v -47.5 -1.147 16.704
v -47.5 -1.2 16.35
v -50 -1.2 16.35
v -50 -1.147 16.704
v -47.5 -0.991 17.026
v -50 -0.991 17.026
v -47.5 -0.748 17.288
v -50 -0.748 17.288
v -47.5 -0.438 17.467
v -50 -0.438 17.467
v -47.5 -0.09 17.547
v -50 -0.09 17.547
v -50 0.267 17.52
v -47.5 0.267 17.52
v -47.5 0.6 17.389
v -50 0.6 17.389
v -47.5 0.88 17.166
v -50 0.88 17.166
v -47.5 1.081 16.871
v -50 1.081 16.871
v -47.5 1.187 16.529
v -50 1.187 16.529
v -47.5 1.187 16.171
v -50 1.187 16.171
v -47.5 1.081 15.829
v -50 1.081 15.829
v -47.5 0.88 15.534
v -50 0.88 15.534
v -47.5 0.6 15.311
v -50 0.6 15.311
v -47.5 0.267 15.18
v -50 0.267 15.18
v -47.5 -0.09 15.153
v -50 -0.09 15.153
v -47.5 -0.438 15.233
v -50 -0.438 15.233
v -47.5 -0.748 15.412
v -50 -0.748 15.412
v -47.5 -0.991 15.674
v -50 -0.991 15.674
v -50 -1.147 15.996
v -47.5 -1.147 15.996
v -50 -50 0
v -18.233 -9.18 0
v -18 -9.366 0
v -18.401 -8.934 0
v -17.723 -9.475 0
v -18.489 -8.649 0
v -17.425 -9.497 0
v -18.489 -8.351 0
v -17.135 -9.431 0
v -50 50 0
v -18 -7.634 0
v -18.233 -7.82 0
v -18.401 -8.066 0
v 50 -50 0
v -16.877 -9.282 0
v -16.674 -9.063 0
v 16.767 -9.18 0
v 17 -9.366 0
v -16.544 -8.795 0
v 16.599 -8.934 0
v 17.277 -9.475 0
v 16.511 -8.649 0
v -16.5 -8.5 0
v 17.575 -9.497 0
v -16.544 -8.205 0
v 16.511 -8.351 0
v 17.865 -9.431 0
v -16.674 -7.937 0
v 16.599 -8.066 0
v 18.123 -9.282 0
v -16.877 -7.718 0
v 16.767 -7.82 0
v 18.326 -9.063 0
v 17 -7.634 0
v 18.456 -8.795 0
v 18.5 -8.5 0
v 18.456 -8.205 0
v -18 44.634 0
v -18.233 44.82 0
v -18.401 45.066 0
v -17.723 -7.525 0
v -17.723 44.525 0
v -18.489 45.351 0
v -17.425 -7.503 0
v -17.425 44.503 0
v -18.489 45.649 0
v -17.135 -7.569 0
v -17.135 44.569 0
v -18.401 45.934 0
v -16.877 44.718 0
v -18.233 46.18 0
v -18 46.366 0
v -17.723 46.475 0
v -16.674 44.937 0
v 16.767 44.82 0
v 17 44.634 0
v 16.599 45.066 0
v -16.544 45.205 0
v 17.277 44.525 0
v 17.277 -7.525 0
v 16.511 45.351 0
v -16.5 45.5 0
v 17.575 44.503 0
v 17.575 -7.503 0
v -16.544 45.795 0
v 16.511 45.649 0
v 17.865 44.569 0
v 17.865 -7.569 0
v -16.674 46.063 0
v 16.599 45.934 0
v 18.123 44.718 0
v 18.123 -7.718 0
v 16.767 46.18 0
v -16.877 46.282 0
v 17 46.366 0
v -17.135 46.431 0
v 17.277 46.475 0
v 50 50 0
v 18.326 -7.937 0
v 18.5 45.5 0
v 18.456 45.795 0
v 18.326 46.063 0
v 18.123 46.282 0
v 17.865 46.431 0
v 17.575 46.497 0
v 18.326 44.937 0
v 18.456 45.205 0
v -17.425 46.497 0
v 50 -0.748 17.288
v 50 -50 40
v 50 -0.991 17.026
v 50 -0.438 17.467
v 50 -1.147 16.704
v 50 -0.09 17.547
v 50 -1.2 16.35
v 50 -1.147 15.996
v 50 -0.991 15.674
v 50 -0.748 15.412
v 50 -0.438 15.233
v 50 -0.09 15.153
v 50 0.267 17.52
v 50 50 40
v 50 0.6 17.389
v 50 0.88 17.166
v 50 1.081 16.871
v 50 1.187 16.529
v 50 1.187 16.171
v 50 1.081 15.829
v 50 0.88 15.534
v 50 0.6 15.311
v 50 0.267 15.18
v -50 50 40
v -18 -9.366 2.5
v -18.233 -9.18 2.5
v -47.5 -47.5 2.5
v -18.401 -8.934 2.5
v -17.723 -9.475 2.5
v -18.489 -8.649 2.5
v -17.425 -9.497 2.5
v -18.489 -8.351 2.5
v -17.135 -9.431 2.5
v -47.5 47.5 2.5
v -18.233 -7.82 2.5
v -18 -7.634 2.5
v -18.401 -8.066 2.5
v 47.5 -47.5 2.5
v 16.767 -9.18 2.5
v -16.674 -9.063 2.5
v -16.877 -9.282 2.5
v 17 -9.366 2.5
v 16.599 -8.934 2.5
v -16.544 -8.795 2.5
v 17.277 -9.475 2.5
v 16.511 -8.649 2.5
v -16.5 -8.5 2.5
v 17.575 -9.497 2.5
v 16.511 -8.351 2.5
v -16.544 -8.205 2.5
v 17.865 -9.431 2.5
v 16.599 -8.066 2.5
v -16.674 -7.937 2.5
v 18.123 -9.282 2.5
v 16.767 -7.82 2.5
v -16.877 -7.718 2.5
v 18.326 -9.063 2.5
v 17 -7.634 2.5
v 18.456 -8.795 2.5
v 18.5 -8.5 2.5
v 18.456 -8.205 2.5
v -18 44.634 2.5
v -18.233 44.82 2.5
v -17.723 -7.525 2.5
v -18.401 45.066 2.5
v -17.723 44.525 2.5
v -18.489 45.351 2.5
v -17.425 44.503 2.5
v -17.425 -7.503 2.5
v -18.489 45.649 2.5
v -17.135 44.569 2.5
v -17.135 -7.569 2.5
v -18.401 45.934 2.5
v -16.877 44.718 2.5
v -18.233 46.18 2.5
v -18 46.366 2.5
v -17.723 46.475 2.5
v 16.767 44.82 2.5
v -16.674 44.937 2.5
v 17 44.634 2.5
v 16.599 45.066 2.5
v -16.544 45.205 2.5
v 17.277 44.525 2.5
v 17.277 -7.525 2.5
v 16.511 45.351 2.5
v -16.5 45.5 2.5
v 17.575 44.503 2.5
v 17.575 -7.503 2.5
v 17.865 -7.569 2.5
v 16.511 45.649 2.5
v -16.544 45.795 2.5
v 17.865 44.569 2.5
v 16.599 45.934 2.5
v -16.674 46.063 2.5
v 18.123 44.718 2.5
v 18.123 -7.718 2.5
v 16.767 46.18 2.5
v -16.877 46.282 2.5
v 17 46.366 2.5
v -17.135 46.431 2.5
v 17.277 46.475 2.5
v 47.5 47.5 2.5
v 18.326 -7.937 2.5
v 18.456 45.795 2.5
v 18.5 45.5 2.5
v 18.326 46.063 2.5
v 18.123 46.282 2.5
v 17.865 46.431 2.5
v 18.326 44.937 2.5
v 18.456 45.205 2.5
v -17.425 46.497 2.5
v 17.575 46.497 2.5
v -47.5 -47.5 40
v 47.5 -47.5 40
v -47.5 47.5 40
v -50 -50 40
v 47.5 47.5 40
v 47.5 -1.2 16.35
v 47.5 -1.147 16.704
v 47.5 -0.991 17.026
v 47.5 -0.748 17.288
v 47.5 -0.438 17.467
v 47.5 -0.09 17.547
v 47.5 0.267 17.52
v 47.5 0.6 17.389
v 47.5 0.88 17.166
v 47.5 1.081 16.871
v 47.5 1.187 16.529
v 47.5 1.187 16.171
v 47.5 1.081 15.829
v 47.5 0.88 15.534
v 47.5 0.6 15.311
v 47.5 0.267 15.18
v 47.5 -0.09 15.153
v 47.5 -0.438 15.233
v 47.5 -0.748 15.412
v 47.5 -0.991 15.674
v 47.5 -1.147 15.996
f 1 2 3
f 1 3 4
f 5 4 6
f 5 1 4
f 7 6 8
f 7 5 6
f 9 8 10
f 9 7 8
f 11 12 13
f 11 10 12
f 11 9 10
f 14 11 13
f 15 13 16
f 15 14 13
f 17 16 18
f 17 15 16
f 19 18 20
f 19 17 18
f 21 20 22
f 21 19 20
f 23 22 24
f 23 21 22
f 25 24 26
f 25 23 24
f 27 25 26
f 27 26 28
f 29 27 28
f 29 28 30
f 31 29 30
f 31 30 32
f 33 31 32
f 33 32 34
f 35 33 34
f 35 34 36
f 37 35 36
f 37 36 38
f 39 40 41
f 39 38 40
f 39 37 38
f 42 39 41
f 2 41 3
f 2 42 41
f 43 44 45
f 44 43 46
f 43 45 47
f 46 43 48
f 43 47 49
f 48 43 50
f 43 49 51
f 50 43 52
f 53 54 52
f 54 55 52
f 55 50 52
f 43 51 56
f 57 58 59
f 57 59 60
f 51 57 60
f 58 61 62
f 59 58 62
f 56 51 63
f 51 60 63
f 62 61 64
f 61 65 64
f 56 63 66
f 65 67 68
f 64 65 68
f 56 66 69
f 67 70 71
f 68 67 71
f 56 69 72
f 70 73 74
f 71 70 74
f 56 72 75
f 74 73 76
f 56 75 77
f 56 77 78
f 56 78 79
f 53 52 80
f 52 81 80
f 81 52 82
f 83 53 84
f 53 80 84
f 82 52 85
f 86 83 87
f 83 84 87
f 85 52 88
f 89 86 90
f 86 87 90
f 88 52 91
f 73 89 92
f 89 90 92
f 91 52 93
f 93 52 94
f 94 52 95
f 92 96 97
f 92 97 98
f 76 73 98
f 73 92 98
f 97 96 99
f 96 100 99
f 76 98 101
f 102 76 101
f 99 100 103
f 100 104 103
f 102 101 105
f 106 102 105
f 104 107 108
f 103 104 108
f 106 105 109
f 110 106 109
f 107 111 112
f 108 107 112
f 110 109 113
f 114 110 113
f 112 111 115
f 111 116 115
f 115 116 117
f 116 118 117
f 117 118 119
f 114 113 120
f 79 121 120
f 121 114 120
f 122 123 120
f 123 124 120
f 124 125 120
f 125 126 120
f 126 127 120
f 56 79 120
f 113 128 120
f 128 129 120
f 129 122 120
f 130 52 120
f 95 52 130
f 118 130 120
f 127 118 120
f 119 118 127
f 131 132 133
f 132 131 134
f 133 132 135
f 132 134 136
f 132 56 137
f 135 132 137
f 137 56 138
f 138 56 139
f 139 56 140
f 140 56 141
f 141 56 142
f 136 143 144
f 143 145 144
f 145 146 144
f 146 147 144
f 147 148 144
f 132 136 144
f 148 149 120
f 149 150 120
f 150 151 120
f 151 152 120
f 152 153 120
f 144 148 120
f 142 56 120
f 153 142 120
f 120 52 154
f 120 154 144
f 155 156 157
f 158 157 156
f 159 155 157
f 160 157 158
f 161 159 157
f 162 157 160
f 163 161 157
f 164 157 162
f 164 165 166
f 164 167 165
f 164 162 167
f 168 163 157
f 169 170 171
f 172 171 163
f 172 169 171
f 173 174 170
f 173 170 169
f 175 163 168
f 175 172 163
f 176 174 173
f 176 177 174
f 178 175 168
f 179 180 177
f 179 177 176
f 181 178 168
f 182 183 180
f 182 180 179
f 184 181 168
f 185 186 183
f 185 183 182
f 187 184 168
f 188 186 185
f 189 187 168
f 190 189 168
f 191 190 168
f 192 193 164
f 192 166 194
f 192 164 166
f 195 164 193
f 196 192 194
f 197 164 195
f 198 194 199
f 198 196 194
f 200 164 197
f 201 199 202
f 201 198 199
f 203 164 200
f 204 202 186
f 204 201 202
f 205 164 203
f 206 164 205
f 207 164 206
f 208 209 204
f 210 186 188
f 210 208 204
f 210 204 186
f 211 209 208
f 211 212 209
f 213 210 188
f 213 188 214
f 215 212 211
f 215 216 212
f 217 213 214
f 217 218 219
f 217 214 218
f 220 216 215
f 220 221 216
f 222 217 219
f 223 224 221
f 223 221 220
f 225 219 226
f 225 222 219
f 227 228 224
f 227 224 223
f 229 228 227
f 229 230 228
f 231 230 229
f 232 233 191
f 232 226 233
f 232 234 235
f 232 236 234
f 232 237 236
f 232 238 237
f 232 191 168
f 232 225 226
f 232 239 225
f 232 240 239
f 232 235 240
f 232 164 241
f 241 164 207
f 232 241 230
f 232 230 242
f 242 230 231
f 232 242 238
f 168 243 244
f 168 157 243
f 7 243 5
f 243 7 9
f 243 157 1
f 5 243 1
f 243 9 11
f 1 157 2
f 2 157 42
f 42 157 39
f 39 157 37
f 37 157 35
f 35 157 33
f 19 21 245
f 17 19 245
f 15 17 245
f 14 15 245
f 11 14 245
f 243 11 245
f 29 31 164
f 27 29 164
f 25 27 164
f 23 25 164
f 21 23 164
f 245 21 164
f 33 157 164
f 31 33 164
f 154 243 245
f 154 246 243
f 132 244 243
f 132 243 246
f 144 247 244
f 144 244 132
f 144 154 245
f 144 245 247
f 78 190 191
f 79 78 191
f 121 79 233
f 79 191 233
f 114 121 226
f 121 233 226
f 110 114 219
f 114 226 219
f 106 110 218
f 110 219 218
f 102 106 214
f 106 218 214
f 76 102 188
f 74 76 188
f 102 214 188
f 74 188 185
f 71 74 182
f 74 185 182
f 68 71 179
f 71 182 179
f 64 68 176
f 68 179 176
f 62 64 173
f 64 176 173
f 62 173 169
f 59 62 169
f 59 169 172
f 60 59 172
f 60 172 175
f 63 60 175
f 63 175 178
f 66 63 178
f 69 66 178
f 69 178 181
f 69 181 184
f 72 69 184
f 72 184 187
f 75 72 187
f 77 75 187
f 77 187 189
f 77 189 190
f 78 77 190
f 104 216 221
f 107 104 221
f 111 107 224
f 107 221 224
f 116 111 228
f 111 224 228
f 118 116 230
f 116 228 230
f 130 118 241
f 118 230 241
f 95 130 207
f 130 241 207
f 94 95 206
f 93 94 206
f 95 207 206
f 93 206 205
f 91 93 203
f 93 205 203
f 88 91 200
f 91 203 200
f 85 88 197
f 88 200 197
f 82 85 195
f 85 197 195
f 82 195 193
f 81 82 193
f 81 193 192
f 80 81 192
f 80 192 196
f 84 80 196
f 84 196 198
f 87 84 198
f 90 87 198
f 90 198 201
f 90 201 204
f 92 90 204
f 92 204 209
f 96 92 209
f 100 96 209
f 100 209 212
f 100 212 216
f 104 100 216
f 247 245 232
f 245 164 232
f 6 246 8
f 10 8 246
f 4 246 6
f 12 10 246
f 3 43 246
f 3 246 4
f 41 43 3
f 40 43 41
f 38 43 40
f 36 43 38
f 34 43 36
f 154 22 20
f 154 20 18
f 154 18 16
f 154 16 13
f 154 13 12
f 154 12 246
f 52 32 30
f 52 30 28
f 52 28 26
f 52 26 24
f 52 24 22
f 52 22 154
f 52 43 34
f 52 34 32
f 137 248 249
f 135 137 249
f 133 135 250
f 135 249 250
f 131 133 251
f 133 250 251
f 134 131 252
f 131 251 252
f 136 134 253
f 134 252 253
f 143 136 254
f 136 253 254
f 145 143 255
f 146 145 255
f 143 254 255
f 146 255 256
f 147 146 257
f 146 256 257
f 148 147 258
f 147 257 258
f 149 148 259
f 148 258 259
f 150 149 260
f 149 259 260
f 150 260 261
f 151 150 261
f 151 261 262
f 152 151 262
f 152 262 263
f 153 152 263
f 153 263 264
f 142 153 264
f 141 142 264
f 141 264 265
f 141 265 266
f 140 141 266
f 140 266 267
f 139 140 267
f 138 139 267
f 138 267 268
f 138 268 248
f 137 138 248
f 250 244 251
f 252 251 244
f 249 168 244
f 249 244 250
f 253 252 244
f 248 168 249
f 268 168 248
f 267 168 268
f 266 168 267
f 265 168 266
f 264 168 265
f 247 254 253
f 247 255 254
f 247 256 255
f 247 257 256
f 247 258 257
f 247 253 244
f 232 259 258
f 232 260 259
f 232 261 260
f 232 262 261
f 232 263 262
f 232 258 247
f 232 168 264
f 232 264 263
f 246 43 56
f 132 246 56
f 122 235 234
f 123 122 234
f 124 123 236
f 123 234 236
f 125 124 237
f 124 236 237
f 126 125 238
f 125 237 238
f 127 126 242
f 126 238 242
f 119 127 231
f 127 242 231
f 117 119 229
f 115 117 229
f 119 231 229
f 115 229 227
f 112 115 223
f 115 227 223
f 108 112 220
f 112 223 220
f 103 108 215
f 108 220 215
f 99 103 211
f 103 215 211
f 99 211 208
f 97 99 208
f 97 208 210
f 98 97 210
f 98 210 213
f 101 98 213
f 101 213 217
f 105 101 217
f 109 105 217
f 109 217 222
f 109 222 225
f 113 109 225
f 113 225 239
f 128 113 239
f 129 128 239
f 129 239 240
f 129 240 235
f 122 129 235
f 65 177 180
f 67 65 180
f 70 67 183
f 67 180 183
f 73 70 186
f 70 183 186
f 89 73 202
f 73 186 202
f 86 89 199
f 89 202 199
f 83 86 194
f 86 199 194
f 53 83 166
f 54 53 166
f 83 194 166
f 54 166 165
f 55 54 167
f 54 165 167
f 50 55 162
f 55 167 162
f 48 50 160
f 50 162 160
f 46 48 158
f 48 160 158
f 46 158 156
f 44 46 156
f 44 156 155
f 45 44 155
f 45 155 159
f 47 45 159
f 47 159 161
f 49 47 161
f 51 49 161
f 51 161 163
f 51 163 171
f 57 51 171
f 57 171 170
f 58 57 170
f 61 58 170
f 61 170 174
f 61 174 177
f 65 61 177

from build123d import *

# Parameters (mm, degrees)
F0_W     = 100
F0_H     = 100
F1_DEPTH = 40
F2_T     = -2.5
F3_R     = 1.2
F4_DEPTH = 97.501
F5_DEPTH = 25
F6_R     = 1
F7_DEPTH = 25


with BuildPart() as f1:
    # F0 (on Top) → F1 (new body)
    with BuildSketch(Plane.XY):
        Rectangle(F0_W, F0_H)
    extrude(amount=F1_DEPTH)

    # F2
    f2_openings = [f1.faces().sort_by_distance(p)[0] for p in [
        (0, 0, 40),
    ]]
    offset(amount=F2_T, openings=f2_openings)

    # F3 (on face) → F4 (cut, through all)
    with BuildSketch(Plane(origin=(47.5, 0, 0), x_dir=(0, -1, 0), z_dir=(-1, 0, 0))):
        with Locations((0, 16.35)):
            Circle(F3_R)
    extrude(amount=F4_DEPTH, mode=Mode.SUBTRACT)

    # F3 (on face) → F5 (cut)
    with BuildSketch(Plane(origin=(47.5, 0, 0), x_dir=(0, -1, 0), z_dir=(-1, 0, 0))):
        with Locations((0, 16.35)):
            Circle(F3_R)
    extrude(amount=-F5_DEPTH, mode=Mode.SUBTRACT)

    # F6 (on face) → F7 (cut)
    with BuildSketch(Plane.XY.offset(2.5)):
        with Locations((-17.5, -8.5)):
            Circle(F6_R)
        with Locations((17.5, -8.5)):
            Circle(F6_R)
        with Locations((17.5, 45.5)):
            Circle(F6_R)
        with Locations((-17.5, 45.5)):
            Circle(F6_R)
    extrude(amount=-F7_DEPTH, mode=Mode.SUBTRACT)


solid = f1.part
